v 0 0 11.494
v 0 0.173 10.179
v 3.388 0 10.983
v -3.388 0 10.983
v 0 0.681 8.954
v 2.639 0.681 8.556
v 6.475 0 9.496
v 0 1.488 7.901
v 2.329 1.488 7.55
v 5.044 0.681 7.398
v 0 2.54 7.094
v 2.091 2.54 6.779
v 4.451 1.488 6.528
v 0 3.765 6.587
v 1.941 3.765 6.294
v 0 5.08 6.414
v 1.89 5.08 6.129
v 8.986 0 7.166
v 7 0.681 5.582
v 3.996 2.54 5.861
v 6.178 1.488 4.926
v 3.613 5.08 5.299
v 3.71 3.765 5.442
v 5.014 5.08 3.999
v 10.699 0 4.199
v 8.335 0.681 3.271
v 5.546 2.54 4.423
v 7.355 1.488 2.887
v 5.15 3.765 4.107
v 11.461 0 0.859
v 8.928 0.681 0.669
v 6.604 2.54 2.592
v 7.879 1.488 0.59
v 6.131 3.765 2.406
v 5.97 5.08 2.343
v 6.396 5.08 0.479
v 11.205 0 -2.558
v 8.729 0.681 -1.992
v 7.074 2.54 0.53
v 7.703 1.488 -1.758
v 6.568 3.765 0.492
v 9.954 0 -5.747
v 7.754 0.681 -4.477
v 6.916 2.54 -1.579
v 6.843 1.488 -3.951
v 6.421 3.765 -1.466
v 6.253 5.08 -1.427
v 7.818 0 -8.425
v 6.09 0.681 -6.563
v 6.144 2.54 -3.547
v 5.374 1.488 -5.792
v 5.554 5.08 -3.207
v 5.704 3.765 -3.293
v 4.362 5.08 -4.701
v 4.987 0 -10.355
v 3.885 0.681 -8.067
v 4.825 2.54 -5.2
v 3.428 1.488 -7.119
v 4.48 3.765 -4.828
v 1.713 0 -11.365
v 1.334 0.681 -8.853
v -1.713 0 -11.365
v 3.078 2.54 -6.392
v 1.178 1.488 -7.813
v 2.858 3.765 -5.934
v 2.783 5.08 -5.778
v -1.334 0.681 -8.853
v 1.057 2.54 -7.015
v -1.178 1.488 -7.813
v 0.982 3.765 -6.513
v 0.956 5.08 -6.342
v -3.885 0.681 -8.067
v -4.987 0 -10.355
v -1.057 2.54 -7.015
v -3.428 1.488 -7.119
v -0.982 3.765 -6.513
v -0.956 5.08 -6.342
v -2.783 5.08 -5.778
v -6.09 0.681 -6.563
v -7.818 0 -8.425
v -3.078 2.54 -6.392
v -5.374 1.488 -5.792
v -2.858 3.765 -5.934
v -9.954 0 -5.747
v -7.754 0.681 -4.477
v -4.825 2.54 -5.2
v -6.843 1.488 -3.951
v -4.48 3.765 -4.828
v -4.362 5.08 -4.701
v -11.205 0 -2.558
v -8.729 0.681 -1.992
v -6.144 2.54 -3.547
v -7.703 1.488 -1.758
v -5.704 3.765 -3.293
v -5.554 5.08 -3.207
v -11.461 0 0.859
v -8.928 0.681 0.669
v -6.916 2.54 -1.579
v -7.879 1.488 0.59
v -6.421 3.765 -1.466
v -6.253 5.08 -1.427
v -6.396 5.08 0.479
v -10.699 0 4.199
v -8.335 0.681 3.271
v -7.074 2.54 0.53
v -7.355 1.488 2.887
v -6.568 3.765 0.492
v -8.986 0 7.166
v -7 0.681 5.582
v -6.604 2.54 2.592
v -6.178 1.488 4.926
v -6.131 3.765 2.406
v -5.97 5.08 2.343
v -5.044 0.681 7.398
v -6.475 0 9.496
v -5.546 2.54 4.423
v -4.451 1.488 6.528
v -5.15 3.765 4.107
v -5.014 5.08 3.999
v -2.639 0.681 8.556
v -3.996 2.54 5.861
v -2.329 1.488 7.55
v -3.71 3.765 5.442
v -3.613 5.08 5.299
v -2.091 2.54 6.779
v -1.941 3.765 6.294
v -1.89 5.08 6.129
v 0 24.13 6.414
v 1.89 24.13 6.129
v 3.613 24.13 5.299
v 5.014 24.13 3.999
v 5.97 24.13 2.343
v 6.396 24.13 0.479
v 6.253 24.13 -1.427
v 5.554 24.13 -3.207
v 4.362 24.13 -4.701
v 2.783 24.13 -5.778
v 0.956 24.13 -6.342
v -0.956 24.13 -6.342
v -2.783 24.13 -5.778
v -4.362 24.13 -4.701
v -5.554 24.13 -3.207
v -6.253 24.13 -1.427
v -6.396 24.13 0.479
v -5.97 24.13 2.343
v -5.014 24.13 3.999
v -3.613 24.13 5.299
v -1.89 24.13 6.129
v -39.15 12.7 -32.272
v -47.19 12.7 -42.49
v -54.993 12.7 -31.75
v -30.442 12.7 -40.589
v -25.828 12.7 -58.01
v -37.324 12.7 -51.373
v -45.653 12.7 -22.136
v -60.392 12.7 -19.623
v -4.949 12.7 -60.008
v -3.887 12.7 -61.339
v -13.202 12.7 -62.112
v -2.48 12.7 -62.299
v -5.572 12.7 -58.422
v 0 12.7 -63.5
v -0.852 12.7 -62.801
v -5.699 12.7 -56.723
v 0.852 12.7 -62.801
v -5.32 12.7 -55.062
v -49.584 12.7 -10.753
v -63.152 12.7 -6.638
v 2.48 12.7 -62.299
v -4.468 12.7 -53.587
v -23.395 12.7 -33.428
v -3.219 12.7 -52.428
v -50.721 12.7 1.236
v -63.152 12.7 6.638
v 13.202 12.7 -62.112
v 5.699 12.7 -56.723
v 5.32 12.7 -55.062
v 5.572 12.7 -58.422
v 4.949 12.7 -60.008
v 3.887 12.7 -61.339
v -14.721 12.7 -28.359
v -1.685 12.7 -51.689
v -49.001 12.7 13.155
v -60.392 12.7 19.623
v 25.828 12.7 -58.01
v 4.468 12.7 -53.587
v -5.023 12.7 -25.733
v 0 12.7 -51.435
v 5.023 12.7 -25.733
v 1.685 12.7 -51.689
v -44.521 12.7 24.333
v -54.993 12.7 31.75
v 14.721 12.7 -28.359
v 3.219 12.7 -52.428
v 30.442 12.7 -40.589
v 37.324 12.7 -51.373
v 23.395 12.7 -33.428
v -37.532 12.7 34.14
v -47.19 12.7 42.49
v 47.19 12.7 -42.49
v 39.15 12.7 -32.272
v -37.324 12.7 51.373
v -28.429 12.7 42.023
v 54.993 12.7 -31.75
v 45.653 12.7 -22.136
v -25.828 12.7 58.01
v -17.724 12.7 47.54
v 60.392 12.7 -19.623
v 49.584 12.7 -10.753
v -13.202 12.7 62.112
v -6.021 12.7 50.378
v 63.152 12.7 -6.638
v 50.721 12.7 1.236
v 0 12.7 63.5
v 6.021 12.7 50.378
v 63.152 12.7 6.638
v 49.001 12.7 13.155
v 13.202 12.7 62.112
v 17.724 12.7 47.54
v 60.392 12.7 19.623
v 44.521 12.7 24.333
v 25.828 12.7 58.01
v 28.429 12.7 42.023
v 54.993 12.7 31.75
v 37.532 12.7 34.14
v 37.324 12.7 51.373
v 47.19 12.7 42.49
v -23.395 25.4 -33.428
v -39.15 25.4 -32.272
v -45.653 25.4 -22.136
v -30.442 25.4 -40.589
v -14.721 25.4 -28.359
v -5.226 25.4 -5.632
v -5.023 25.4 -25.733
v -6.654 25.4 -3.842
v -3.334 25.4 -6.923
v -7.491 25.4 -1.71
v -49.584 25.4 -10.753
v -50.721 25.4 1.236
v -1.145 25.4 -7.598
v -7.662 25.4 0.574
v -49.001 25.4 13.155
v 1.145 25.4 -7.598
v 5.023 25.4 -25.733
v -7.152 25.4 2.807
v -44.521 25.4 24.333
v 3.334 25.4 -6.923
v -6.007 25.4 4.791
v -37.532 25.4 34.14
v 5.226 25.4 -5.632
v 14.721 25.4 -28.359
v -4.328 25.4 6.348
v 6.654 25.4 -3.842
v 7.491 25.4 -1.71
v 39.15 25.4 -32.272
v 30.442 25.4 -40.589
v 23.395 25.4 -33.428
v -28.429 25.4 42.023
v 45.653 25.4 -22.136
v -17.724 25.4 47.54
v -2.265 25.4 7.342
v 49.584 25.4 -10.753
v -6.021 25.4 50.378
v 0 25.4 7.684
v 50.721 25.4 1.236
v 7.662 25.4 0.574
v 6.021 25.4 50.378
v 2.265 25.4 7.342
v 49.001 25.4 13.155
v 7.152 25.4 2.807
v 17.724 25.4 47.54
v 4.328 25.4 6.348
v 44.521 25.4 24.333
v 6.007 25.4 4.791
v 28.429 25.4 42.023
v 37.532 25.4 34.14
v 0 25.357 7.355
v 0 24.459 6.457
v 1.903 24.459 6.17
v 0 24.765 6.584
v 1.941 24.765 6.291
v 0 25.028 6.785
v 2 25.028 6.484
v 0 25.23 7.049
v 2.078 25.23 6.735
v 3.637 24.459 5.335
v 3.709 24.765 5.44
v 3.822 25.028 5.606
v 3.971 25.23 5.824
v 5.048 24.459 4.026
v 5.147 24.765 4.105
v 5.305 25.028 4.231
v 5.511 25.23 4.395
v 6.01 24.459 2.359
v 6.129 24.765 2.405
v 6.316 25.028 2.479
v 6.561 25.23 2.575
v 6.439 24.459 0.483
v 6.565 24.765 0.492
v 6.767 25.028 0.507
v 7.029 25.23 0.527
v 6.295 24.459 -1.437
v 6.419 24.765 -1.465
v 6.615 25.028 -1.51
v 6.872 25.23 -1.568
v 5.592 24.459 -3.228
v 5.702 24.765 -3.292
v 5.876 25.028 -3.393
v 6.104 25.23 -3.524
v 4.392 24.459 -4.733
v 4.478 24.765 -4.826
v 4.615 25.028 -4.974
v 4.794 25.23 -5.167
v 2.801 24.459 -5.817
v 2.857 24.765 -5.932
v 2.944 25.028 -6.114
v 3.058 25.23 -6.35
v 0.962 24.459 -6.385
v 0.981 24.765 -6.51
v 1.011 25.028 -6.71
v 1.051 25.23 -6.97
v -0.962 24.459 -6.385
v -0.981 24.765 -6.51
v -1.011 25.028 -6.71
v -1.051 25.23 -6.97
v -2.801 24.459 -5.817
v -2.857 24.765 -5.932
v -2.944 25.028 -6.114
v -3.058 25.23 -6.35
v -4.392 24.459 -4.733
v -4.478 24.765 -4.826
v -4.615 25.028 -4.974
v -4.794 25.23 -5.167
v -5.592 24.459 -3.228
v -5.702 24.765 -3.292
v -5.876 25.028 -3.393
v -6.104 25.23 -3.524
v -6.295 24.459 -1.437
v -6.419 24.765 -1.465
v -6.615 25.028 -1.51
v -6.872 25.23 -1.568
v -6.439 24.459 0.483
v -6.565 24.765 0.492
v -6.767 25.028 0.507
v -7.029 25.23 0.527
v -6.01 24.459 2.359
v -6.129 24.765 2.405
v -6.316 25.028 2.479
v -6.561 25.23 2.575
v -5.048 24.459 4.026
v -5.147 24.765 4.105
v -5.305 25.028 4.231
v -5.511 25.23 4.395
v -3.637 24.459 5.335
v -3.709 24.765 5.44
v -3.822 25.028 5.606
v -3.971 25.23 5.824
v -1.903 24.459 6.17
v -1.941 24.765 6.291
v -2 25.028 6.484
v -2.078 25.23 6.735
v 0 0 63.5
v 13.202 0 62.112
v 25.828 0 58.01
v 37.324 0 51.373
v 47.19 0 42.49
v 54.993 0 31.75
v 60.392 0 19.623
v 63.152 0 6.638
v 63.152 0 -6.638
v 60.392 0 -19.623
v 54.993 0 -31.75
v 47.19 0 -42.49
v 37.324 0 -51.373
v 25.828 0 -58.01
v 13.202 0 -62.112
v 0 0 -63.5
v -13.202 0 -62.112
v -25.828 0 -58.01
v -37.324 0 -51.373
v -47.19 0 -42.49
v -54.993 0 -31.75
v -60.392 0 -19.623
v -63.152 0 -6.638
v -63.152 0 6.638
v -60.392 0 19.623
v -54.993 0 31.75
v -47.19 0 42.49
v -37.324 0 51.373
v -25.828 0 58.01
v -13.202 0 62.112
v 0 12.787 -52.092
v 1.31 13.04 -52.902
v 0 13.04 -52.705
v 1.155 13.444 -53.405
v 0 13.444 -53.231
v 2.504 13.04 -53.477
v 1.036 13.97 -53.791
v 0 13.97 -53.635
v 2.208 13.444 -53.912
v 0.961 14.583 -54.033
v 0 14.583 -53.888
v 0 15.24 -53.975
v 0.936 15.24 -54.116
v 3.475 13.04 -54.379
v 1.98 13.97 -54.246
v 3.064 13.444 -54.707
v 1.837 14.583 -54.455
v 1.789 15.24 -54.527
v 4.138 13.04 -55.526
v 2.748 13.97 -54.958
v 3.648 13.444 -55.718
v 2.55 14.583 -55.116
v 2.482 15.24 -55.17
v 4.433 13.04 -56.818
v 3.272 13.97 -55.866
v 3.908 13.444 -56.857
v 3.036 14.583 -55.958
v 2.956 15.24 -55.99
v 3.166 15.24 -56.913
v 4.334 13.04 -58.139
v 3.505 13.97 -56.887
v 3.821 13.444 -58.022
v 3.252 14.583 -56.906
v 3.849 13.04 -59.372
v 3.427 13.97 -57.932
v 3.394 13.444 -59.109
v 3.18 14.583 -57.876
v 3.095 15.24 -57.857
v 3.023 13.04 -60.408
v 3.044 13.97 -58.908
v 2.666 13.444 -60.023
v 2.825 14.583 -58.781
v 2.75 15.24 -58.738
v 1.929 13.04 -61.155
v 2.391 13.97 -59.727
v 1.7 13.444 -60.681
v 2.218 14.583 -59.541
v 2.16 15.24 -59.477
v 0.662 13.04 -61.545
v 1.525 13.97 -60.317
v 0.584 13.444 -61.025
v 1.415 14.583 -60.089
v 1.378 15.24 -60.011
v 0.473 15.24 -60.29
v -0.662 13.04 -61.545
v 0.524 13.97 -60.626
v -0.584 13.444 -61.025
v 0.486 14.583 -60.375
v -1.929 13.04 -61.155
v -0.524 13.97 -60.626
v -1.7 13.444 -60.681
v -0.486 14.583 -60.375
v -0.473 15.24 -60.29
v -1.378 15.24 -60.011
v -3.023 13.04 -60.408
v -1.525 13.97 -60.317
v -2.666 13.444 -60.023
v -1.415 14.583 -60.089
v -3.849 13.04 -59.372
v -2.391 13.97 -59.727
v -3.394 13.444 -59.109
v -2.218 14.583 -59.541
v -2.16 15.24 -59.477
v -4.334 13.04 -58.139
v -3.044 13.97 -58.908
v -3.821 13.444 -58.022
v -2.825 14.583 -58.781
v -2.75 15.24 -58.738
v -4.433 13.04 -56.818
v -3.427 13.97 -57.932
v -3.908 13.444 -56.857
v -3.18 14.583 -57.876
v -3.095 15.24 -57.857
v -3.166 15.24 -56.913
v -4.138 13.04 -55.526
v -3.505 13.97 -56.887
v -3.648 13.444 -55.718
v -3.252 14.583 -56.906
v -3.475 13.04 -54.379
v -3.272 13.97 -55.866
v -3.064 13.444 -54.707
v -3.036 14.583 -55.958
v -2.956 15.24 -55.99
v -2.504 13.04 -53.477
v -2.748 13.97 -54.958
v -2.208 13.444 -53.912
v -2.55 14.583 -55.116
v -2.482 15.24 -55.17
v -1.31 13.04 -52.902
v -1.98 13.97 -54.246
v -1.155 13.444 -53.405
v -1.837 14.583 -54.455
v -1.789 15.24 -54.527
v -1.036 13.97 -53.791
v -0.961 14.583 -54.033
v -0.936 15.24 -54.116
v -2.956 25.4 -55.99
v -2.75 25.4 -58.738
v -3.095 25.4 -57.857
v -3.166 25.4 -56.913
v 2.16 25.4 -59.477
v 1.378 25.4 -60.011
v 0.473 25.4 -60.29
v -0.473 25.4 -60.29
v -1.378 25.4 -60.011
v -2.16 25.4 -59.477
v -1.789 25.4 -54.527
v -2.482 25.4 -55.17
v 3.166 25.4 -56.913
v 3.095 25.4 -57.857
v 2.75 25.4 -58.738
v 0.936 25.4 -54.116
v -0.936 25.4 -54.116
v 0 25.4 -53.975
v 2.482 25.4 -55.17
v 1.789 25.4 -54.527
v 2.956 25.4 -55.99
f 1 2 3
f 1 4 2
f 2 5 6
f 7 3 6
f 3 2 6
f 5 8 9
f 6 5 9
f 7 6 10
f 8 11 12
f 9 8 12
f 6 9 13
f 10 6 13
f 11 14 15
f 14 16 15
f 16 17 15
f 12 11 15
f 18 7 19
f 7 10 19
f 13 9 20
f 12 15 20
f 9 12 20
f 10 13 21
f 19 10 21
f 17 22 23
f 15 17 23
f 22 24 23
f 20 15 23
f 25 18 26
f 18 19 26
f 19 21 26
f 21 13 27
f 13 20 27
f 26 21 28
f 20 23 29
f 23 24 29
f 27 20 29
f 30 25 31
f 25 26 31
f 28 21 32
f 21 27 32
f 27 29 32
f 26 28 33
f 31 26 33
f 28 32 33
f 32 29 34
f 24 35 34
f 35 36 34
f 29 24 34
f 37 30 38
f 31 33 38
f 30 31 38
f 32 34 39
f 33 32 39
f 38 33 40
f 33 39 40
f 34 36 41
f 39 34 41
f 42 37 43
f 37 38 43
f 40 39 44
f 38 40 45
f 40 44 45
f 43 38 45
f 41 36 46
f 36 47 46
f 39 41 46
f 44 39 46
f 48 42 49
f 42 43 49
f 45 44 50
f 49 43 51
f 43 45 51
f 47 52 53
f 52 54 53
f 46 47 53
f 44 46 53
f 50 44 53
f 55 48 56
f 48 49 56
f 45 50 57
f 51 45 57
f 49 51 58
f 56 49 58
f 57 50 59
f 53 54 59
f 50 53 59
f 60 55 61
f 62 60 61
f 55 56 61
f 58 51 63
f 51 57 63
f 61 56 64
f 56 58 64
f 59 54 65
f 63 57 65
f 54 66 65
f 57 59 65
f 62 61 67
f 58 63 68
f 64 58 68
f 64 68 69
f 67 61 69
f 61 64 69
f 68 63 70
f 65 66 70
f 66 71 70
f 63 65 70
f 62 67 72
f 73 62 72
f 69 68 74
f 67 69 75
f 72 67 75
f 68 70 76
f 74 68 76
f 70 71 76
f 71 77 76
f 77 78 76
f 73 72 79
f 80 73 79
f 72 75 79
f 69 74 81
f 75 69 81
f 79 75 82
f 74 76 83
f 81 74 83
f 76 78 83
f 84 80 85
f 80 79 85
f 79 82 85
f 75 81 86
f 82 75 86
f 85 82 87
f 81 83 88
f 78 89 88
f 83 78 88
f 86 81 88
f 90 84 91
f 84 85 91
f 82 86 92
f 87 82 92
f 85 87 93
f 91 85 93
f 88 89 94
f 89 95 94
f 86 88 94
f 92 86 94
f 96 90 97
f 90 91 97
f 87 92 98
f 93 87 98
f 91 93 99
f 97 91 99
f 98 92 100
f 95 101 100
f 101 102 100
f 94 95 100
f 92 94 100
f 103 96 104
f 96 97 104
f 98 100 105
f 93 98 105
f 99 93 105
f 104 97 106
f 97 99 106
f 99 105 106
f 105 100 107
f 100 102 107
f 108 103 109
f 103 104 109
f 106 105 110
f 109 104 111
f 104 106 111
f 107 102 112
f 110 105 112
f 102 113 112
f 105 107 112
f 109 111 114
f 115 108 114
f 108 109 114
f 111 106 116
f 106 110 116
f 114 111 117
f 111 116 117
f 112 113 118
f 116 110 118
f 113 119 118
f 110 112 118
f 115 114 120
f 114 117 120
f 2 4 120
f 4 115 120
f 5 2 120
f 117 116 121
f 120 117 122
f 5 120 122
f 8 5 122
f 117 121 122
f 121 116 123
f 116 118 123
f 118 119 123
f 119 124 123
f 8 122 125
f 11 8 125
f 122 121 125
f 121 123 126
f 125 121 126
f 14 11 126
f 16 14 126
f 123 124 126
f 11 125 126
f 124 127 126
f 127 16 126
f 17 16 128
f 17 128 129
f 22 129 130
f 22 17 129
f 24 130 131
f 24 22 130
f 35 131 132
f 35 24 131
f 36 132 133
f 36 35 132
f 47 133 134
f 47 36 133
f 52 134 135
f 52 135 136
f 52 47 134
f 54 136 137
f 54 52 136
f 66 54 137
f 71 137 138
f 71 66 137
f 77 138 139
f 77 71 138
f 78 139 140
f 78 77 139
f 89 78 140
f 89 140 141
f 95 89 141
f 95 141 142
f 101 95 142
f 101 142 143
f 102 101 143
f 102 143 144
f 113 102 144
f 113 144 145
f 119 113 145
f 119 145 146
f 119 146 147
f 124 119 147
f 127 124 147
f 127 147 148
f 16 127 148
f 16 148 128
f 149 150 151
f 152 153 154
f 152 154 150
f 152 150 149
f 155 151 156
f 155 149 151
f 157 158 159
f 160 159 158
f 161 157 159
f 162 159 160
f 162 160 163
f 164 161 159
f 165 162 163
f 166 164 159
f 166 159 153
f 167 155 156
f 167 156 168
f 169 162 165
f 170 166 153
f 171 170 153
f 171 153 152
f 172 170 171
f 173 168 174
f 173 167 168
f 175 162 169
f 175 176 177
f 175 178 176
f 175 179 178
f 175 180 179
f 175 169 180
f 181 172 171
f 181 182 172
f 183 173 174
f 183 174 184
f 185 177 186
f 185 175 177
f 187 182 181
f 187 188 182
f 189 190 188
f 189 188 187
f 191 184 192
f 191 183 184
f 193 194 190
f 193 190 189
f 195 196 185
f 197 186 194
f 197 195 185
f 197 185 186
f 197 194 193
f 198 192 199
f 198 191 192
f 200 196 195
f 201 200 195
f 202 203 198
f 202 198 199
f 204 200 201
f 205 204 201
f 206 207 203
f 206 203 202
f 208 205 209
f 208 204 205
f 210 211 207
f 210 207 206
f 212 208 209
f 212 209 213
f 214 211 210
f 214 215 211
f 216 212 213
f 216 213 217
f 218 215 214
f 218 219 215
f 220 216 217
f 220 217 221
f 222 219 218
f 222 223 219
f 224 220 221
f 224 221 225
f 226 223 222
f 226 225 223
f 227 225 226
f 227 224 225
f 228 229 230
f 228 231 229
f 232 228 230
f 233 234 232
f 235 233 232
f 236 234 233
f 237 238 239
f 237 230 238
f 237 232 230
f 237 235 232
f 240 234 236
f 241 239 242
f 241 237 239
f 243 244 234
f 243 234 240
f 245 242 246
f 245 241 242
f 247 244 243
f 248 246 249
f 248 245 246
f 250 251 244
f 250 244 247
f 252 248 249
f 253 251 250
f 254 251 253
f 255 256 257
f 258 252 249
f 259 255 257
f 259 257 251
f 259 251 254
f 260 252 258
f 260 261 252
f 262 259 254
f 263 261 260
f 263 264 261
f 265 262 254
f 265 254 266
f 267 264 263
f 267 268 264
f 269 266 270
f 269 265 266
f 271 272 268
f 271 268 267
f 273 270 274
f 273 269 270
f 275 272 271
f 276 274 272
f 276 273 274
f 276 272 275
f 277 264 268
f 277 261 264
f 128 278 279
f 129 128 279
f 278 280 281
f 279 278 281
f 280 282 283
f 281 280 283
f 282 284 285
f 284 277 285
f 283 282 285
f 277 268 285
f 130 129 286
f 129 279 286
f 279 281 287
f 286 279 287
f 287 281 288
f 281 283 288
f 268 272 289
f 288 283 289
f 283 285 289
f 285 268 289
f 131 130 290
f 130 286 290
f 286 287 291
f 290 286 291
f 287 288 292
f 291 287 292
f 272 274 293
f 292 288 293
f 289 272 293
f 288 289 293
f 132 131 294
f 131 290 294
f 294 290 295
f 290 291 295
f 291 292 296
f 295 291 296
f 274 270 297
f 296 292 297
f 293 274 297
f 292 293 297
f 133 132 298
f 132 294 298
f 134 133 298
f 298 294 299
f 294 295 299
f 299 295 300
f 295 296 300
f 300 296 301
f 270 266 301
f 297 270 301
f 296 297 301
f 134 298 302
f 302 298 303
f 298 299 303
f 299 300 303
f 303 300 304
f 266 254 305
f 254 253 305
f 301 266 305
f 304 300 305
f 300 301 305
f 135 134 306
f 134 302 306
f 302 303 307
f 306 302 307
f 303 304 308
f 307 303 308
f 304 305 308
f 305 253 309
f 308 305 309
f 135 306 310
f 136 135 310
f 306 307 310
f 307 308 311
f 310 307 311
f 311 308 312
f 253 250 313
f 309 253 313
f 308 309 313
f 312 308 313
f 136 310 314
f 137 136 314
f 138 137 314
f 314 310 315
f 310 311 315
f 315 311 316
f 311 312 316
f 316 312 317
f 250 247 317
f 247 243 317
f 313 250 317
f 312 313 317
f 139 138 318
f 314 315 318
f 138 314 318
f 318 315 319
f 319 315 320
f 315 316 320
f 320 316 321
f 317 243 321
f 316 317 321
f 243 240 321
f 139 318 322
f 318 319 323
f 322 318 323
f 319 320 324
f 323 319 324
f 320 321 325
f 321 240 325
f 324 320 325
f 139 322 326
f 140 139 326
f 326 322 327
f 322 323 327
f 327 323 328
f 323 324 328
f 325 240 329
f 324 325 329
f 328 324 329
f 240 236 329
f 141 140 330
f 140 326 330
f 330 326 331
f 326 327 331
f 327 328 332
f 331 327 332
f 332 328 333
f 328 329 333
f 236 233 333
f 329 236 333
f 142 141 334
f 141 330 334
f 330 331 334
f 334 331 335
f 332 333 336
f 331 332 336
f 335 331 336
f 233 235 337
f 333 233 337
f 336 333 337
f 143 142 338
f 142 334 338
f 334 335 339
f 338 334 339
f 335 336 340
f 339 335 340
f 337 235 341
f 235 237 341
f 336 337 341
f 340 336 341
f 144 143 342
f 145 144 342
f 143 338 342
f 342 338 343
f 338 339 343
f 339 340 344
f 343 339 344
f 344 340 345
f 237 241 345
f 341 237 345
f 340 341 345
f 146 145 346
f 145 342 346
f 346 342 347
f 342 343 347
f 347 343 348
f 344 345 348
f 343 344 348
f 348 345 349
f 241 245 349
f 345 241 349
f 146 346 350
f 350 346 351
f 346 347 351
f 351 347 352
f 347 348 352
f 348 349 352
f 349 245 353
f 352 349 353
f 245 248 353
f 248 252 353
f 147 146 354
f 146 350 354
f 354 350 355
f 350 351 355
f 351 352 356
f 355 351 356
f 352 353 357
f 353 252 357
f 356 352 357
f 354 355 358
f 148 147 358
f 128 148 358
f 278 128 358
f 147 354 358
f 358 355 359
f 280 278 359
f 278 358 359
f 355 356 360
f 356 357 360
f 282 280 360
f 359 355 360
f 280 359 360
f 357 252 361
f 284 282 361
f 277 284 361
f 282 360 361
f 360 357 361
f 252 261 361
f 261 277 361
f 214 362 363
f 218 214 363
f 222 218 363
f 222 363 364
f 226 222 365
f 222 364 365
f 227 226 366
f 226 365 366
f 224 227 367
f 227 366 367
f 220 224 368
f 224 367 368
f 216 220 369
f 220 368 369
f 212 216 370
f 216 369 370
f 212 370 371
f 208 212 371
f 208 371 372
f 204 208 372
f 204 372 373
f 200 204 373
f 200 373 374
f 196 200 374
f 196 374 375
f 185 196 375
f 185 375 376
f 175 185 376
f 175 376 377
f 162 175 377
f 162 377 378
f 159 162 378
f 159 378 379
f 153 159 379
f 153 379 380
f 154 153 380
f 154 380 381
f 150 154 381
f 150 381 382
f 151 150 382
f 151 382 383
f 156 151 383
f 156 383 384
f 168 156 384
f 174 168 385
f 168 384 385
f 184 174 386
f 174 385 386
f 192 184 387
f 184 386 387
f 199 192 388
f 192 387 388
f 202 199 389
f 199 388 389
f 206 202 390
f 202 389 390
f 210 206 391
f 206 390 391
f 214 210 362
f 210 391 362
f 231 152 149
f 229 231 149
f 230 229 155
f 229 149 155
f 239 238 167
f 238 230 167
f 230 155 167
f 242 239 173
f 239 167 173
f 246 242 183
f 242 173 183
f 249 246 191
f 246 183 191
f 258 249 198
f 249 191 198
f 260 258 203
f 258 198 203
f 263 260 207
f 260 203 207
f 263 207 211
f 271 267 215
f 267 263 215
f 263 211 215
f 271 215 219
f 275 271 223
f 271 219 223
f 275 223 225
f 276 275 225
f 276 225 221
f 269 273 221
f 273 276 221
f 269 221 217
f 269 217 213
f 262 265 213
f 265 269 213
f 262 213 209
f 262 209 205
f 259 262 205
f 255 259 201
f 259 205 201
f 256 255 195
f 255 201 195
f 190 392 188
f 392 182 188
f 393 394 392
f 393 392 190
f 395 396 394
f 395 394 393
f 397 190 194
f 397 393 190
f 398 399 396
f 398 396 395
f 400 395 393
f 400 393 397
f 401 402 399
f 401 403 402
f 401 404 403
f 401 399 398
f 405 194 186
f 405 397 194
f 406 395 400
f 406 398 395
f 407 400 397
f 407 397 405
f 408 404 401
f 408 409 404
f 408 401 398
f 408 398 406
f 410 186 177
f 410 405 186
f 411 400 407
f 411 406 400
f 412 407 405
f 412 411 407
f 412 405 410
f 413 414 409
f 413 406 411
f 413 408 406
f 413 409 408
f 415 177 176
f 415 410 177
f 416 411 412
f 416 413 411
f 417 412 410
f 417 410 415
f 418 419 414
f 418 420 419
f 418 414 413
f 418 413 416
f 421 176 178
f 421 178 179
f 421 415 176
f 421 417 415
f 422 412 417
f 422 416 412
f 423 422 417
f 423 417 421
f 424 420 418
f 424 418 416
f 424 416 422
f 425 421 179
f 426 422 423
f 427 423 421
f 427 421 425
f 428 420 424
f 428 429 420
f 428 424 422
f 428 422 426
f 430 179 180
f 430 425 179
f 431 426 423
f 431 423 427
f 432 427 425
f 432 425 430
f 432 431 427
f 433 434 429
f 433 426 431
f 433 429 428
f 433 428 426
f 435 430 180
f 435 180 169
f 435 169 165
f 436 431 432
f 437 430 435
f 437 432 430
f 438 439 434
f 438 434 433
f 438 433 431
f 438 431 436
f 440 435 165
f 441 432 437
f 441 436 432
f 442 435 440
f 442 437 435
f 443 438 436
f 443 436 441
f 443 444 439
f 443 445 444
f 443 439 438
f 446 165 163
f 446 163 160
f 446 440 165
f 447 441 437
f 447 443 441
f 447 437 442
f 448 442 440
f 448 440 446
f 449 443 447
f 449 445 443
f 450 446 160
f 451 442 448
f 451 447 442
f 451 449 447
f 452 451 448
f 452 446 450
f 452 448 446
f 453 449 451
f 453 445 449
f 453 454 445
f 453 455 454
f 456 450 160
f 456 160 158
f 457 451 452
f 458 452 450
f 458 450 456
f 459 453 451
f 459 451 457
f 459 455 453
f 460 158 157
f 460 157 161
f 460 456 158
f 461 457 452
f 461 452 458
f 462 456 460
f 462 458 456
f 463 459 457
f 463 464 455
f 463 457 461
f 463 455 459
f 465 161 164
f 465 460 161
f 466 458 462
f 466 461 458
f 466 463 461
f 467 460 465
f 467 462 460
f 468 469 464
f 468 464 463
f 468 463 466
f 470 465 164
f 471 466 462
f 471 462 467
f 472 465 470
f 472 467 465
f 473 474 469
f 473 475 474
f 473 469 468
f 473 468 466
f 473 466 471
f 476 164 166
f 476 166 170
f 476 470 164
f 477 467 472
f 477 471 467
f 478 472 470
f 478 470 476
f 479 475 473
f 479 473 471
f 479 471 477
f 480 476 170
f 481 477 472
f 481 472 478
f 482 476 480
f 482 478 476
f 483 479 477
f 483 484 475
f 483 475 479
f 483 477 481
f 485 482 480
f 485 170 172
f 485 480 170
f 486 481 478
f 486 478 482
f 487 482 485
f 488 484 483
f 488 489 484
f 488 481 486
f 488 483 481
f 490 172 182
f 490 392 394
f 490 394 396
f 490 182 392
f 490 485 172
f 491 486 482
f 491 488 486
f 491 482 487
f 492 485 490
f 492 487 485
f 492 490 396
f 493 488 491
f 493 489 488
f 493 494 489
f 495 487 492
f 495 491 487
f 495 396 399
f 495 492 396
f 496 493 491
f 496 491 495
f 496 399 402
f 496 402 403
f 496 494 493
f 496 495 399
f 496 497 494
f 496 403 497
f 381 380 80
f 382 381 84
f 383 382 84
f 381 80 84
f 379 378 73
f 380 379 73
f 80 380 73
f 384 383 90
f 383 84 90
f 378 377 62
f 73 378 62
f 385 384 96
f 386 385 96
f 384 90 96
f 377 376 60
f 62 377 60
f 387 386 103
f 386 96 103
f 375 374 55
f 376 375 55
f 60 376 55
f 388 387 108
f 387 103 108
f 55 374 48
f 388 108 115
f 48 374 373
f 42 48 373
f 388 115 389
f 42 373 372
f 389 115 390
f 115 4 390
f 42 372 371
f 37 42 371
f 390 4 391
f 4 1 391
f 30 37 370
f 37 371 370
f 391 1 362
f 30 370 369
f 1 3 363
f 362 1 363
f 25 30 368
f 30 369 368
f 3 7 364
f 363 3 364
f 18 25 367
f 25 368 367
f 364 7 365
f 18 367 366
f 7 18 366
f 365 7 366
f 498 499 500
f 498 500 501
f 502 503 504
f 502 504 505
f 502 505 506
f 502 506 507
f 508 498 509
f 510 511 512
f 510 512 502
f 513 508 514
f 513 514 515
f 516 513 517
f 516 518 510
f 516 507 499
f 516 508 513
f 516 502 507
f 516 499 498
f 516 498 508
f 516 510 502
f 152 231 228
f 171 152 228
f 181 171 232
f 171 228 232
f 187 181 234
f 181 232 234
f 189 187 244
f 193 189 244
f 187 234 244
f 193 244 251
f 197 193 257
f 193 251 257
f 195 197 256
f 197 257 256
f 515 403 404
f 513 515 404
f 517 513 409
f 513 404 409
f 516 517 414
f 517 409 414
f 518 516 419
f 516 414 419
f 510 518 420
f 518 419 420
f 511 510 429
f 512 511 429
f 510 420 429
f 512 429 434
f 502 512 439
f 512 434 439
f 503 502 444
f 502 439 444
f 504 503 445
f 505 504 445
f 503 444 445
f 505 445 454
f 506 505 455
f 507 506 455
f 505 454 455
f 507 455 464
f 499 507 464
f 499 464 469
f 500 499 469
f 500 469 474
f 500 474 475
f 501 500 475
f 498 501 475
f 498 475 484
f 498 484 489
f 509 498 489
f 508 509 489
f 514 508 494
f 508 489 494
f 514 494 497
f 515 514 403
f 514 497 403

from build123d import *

# Parameters (mm, degrees)
SKETCH1_R           = 63.5
SKETCH1_R_2         = 6.4135
BOSS_EXTRUDE1_DEPTH = 12.7
SKETCH2_R           = 50.7365
SKETCH2_R_2         = 6.4135
BOSS_EXTRUDE2_DEPTH = 12.7
SKETCH3_R           = 38.1
CUT_EXTRUDE2_DEPTH  = 12.7
SKETCH4_R           = 3.175
BOSS_EXTRUDE3_DEPTH = 12.7
FILLET1_R           = 2.54
FILLET2_R           = 5.08
FILLET3_R           = 1.27


with BuildPart() as part:
    # Sketch1 → Boss-Extrude1 (new body)
    with BuildSketch(Plane(origin=(0, 0, 0), x_dir=(1, 0, 0), z_dir=(0, 1, 0))):
        with Locations(Location((0, 0, 0), (0, 0, 270))):
            Circle(SKETCH1_R)
        with Locations(Location((0, 0, 0), (0, 0, 270))):
            Circle(SKETCH1_R_2, mode=Mode.SUBTRACT)
    extrude(amount=BOSS_EXTRUDE1_DEPTH)

    # Sketch2 → Boss-Extrude2 (add)
    with BuildSketch(Plane(origin=(0, 12.7, 0), x_dir=(1, 0, 0), z_dir=(0, 1, 0))):
        with Locations(Location((0, 0, 0), (0, 0, 270))):
            Circle(SKETCH2_R)
        with Locations(Location((0, 0, 0), (0, 0, 270))):
            Circle(SKETCH2_R_2, mode=Mode.SUBTRACT)
    extrude(amount=BOSS_EXTRUDE2_DEPTH)

    # Sketch3 → Cut-Extrude2 (cut)
    with BuildSketch(Plane(origin=(0, 25.4, 0), x_dir=(1, 0, 0), z_dir=(0, 1, 0))):
        with Locations((0, 63.5)):
            Circle(SKETCH3_R)
    extrude(amount=-CUT_EXTRUDE2_DEPTH, mode=Mode.SUBTRACT)

    # Sketch4 → Boss-Extrude3 (add)
    with BuildSketch(Plane(origin=(0, 12.7, 0), x_dir=(1, 0, 0), z_dir=(0, 1, 0))):
        with Locations(Location((0, 57.15, 0), (0, 0, 270))):
            Circle(SKETCH4_R)
    extrude(amount=BOSS_EXTRUDE3_DEPTH)

    # Fillet1
    fillet1_edges = [part.edges().sort_by_distance(p)[0] for p in [
        (0, 12.7, -60.325),
    ]]
    fillet(fillet1_edges, radius=FILLET1_R)

    # Fillet2
    fillet2_edges = [part.edges().sort_by_distance(p)[0] for p in [
        (0, 0, -6.4135),
    ]]
    fillet(fillet2_edges, radius=FILLET2_R)

    # Fillet3
    fillet3_edges = [part.edges().sort_by_distance(p)[0] for p in [
        (0, 25.4, -6.4135),
    ]]
    fillet(fillet3_edges, radius=FILLET3_R)


solid = part.part
